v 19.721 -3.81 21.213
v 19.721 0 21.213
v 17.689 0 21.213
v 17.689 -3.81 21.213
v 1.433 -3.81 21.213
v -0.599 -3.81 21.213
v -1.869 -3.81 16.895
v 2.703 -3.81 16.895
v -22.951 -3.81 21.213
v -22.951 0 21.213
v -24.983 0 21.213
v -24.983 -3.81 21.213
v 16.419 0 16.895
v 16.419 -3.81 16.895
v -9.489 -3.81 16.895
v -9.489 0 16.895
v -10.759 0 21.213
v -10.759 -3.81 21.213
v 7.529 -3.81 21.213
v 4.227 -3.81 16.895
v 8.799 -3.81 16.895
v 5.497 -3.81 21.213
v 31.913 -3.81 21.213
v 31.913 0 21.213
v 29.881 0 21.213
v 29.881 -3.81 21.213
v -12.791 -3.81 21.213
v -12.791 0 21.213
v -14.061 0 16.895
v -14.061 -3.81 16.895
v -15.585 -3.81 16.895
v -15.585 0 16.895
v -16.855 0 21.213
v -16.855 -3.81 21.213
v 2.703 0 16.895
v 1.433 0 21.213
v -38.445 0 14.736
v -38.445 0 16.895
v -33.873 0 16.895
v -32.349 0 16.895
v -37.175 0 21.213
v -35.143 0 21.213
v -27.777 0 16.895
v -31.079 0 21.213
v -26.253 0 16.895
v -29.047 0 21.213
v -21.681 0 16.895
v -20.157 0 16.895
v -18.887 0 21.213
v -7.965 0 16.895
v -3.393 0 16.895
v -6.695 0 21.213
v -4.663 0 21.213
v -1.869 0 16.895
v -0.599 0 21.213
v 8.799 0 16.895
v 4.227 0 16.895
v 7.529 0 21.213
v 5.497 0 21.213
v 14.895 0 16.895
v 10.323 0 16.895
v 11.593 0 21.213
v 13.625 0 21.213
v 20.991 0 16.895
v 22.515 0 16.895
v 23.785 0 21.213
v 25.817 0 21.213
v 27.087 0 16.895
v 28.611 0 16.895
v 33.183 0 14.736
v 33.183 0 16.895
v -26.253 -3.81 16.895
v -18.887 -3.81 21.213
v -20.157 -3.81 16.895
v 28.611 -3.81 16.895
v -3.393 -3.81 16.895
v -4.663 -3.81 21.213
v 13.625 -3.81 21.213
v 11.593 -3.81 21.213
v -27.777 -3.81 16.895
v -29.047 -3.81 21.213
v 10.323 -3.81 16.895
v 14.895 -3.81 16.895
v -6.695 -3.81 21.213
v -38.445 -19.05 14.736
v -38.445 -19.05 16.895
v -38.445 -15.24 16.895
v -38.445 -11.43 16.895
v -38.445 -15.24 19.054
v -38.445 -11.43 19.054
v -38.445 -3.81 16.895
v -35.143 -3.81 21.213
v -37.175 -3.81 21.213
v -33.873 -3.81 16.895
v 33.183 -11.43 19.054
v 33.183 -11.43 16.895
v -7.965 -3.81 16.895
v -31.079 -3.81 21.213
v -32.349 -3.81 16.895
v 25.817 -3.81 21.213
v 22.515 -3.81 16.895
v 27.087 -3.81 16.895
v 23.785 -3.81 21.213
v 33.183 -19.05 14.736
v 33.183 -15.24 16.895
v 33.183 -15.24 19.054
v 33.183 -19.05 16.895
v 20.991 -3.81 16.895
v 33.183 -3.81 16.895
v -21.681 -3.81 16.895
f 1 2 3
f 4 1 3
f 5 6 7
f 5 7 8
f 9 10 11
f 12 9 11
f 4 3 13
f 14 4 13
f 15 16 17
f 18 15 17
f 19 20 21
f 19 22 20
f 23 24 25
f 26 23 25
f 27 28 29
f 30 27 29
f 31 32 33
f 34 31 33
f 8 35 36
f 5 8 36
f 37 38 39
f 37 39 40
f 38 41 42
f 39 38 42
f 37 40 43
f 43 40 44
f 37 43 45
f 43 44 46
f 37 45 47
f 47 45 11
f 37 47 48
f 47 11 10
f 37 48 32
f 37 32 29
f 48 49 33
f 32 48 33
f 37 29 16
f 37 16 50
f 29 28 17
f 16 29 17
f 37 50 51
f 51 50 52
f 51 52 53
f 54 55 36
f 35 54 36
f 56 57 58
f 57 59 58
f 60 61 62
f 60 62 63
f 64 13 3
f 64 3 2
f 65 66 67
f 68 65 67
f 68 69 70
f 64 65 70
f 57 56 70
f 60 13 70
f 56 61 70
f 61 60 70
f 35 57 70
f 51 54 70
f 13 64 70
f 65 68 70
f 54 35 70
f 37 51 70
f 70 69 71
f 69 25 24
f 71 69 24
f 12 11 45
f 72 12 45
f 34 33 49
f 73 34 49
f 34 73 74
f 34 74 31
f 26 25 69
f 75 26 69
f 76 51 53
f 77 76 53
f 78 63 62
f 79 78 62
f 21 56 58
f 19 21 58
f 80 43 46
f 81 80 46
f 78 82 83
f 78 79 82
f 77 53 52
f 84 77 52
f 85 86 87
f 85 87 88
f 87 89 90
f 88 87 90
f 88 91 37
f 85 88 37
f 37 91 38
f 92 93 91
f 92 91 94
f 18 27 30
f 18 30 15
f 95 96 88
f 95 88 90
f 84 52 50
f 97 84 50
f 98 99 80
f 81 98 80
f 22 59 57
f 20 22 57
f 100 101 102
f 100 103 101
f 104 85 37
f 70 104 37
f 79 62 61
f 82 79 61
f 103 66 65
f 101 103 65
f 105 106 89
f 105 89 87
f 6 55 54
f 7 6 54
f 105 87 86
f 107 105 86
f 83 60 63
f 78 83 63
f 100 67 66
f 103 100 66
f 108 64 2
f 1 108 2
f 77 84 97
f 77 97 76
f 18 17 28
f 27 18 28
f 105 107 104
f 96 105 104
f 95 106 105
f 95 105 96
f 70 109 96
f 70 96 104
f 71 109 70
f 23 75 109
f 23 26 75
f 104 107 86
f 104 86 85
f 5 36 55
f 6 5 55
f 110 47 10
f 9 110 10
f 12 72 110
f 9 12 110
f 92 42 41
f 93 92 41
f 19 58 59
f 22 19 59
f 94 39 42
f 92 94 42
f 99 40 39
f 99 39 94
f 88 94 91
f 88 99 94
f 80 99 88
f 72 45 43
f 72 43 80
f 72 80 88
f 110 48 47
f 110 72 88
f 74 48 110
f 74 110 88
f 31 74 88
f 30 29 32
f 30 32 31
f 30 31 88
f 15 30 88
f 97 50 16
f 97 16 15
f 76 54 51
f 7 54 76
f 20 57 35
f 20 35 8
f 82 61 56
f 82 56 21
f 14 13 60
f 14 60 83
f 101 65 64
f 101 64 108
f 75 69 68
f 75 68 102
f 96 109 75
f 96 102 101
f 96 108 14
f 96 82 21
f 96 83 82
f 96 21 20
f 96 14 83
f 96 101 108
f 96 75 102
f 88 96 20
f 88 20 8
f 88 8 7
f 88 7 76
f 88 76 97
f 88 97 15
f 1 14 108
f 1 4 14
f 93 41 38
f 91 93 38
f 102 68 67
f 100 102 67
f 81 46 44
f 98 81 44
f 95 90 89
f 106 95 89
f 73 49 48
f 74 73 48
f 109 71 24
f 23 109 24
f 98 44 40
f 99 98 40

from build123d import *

# Parameters (mm, degrees)
F1_DEPTH = 3.81
F4_DEPTH = 71.628


with BuildPart() as f1:
    # F0 (on Front) → F1 (new body)
    with BuildSketch(Plane.XZ):
        Polygon((-38.4448663006, 16.8945933835), (-38.4448663006, 14.7355933835), (33.1831336994, 14.7355933835), (33.1831336994, 16.8945933835), (28.6111336994, 16.8945933835), (27.0871336994, 16.8945933835), (22.5151336994, 16.8945933835), (20.9911336994, 16.8945933835), (16.4191336994, 16.8945933835), (14.8951336994, 16.8945933835), (10.3231336994, 16.8945933835), (8.7991336994, 16.8945933835), (4.2271336994, 16.8945933835), (2.7031336994, 16.8945933835), (-1.8688663006, 16.8945933835), (-3.3928663006, 16.8945933835), (-7.9648663006, 16.8945933835), (-9.4888663006, 16.8945933835), (-14.0608663006, 16.8945933835), (-15.5848663006, 16.8945933835), (-20.1568663006, 16.8945933835), (-21.6808663006, 16.8945933835), (-26.2528663006, 16.8945933835), (-27.7768663006, 16.8945933835), (-32.3488663006, 16.8945933835), (-33.8728663006, 16.8945933835), align=None)
        Polygon((-37.1748663006, 21.2125933835), (-38.4448663006, 16.8945933835), (-33.8728663006, 16.8945933835), (-35.1428663006, 21.2125933835), align=None)
        Polygon((28.6111336994, 16.8945933835), (33.1831336994, 16.8945933835), (31.9131336994, 21.2125933835), (29.8811336994, 21.2125933835), align=None)
        Polygon((-31.0788663006, 21.2125933835), (-32.3488663006, 16.8945933835), (-27.7768663006, 16.8945933835), (-29.0468663006, 21.2125933835), align=None)
        Polygon((22.5151336994, 16.8945933835), (27.0871336994, 16.8945933835), (25.8171336994, 21.2125933835), (23.7851336994, 21.2125933835), align=None)
        Polygon((-24.9828663006, 21.2125933835), (-26.2528663006, 16.8945933835), (-21.6808663006, 16.8945933835), (-22.9508663006, 21.2125933835), align=None)
        Polygon((16.4191336994, 16.8945933835), (20.9911336994, 16.8945933835), (19.7211336994, 21.2125933835), (17.6891336994, 21.2125933835), align=None)
        Polygon((-18.8868663006, 21.2125933835), (-20.1568663006, 16.8945933835), (-15.5848663006, 16.8945933835), (-16.8548663006, 21.2125933835), align=None)
        Polygon((10.3231336994, 16.8945933835), (14.8951336994, 16.8945933835), (13.6251336994, 21.2125933835), (11.5931336994, 21.2125933835), align=None)
        Polygon((-12.7908663006, 21.2125933835), (-14.0608663006, 16.8945933835), (-9.4888663006, 16.8945933835), (-10.7588663006, 21.2125933835), align=None)
        Polygon((4.2271336994, 16.8945933835), (8.7991336994, 16.8945933835), (7.5291336994, 21.2125933835), (5.4971336994, 21.2125933835), align=None)
        Polygon((-6.6948663006, 21.2125933835), (-7.9648663006, 16.8945933835), (-3.3928663006, 16.8945933835), (-4.6628663006, 21.2125933835), align=None)
        Polygon((-1.8688663006, 16.8945933835), (2.7031336994, 16.8945933835), (1.4331336994, 21.2125933835), (-0.5988663006, 21.2125933835), align=None)
    extrude(amount=F1_DEPTH)

    # F3 (on plane+point) → F4 (join, through all)
    with BuildSketch(Plane.YZ.offset(33.1831336994)):
        Polygon((-19.05, 14.7355933835), (-3.81, 14.7355933835), (-3.81, 16.8945933835), (-11.43, 16.8945933835), (-11.43, 19.0535933835), (-15.24, 19.0535933835), (-15.24, 16.8945933835), (-19.05, 16.8945933835), align=None)
    extrude(amount=-F4_DEPTH)


solid = f1.part
